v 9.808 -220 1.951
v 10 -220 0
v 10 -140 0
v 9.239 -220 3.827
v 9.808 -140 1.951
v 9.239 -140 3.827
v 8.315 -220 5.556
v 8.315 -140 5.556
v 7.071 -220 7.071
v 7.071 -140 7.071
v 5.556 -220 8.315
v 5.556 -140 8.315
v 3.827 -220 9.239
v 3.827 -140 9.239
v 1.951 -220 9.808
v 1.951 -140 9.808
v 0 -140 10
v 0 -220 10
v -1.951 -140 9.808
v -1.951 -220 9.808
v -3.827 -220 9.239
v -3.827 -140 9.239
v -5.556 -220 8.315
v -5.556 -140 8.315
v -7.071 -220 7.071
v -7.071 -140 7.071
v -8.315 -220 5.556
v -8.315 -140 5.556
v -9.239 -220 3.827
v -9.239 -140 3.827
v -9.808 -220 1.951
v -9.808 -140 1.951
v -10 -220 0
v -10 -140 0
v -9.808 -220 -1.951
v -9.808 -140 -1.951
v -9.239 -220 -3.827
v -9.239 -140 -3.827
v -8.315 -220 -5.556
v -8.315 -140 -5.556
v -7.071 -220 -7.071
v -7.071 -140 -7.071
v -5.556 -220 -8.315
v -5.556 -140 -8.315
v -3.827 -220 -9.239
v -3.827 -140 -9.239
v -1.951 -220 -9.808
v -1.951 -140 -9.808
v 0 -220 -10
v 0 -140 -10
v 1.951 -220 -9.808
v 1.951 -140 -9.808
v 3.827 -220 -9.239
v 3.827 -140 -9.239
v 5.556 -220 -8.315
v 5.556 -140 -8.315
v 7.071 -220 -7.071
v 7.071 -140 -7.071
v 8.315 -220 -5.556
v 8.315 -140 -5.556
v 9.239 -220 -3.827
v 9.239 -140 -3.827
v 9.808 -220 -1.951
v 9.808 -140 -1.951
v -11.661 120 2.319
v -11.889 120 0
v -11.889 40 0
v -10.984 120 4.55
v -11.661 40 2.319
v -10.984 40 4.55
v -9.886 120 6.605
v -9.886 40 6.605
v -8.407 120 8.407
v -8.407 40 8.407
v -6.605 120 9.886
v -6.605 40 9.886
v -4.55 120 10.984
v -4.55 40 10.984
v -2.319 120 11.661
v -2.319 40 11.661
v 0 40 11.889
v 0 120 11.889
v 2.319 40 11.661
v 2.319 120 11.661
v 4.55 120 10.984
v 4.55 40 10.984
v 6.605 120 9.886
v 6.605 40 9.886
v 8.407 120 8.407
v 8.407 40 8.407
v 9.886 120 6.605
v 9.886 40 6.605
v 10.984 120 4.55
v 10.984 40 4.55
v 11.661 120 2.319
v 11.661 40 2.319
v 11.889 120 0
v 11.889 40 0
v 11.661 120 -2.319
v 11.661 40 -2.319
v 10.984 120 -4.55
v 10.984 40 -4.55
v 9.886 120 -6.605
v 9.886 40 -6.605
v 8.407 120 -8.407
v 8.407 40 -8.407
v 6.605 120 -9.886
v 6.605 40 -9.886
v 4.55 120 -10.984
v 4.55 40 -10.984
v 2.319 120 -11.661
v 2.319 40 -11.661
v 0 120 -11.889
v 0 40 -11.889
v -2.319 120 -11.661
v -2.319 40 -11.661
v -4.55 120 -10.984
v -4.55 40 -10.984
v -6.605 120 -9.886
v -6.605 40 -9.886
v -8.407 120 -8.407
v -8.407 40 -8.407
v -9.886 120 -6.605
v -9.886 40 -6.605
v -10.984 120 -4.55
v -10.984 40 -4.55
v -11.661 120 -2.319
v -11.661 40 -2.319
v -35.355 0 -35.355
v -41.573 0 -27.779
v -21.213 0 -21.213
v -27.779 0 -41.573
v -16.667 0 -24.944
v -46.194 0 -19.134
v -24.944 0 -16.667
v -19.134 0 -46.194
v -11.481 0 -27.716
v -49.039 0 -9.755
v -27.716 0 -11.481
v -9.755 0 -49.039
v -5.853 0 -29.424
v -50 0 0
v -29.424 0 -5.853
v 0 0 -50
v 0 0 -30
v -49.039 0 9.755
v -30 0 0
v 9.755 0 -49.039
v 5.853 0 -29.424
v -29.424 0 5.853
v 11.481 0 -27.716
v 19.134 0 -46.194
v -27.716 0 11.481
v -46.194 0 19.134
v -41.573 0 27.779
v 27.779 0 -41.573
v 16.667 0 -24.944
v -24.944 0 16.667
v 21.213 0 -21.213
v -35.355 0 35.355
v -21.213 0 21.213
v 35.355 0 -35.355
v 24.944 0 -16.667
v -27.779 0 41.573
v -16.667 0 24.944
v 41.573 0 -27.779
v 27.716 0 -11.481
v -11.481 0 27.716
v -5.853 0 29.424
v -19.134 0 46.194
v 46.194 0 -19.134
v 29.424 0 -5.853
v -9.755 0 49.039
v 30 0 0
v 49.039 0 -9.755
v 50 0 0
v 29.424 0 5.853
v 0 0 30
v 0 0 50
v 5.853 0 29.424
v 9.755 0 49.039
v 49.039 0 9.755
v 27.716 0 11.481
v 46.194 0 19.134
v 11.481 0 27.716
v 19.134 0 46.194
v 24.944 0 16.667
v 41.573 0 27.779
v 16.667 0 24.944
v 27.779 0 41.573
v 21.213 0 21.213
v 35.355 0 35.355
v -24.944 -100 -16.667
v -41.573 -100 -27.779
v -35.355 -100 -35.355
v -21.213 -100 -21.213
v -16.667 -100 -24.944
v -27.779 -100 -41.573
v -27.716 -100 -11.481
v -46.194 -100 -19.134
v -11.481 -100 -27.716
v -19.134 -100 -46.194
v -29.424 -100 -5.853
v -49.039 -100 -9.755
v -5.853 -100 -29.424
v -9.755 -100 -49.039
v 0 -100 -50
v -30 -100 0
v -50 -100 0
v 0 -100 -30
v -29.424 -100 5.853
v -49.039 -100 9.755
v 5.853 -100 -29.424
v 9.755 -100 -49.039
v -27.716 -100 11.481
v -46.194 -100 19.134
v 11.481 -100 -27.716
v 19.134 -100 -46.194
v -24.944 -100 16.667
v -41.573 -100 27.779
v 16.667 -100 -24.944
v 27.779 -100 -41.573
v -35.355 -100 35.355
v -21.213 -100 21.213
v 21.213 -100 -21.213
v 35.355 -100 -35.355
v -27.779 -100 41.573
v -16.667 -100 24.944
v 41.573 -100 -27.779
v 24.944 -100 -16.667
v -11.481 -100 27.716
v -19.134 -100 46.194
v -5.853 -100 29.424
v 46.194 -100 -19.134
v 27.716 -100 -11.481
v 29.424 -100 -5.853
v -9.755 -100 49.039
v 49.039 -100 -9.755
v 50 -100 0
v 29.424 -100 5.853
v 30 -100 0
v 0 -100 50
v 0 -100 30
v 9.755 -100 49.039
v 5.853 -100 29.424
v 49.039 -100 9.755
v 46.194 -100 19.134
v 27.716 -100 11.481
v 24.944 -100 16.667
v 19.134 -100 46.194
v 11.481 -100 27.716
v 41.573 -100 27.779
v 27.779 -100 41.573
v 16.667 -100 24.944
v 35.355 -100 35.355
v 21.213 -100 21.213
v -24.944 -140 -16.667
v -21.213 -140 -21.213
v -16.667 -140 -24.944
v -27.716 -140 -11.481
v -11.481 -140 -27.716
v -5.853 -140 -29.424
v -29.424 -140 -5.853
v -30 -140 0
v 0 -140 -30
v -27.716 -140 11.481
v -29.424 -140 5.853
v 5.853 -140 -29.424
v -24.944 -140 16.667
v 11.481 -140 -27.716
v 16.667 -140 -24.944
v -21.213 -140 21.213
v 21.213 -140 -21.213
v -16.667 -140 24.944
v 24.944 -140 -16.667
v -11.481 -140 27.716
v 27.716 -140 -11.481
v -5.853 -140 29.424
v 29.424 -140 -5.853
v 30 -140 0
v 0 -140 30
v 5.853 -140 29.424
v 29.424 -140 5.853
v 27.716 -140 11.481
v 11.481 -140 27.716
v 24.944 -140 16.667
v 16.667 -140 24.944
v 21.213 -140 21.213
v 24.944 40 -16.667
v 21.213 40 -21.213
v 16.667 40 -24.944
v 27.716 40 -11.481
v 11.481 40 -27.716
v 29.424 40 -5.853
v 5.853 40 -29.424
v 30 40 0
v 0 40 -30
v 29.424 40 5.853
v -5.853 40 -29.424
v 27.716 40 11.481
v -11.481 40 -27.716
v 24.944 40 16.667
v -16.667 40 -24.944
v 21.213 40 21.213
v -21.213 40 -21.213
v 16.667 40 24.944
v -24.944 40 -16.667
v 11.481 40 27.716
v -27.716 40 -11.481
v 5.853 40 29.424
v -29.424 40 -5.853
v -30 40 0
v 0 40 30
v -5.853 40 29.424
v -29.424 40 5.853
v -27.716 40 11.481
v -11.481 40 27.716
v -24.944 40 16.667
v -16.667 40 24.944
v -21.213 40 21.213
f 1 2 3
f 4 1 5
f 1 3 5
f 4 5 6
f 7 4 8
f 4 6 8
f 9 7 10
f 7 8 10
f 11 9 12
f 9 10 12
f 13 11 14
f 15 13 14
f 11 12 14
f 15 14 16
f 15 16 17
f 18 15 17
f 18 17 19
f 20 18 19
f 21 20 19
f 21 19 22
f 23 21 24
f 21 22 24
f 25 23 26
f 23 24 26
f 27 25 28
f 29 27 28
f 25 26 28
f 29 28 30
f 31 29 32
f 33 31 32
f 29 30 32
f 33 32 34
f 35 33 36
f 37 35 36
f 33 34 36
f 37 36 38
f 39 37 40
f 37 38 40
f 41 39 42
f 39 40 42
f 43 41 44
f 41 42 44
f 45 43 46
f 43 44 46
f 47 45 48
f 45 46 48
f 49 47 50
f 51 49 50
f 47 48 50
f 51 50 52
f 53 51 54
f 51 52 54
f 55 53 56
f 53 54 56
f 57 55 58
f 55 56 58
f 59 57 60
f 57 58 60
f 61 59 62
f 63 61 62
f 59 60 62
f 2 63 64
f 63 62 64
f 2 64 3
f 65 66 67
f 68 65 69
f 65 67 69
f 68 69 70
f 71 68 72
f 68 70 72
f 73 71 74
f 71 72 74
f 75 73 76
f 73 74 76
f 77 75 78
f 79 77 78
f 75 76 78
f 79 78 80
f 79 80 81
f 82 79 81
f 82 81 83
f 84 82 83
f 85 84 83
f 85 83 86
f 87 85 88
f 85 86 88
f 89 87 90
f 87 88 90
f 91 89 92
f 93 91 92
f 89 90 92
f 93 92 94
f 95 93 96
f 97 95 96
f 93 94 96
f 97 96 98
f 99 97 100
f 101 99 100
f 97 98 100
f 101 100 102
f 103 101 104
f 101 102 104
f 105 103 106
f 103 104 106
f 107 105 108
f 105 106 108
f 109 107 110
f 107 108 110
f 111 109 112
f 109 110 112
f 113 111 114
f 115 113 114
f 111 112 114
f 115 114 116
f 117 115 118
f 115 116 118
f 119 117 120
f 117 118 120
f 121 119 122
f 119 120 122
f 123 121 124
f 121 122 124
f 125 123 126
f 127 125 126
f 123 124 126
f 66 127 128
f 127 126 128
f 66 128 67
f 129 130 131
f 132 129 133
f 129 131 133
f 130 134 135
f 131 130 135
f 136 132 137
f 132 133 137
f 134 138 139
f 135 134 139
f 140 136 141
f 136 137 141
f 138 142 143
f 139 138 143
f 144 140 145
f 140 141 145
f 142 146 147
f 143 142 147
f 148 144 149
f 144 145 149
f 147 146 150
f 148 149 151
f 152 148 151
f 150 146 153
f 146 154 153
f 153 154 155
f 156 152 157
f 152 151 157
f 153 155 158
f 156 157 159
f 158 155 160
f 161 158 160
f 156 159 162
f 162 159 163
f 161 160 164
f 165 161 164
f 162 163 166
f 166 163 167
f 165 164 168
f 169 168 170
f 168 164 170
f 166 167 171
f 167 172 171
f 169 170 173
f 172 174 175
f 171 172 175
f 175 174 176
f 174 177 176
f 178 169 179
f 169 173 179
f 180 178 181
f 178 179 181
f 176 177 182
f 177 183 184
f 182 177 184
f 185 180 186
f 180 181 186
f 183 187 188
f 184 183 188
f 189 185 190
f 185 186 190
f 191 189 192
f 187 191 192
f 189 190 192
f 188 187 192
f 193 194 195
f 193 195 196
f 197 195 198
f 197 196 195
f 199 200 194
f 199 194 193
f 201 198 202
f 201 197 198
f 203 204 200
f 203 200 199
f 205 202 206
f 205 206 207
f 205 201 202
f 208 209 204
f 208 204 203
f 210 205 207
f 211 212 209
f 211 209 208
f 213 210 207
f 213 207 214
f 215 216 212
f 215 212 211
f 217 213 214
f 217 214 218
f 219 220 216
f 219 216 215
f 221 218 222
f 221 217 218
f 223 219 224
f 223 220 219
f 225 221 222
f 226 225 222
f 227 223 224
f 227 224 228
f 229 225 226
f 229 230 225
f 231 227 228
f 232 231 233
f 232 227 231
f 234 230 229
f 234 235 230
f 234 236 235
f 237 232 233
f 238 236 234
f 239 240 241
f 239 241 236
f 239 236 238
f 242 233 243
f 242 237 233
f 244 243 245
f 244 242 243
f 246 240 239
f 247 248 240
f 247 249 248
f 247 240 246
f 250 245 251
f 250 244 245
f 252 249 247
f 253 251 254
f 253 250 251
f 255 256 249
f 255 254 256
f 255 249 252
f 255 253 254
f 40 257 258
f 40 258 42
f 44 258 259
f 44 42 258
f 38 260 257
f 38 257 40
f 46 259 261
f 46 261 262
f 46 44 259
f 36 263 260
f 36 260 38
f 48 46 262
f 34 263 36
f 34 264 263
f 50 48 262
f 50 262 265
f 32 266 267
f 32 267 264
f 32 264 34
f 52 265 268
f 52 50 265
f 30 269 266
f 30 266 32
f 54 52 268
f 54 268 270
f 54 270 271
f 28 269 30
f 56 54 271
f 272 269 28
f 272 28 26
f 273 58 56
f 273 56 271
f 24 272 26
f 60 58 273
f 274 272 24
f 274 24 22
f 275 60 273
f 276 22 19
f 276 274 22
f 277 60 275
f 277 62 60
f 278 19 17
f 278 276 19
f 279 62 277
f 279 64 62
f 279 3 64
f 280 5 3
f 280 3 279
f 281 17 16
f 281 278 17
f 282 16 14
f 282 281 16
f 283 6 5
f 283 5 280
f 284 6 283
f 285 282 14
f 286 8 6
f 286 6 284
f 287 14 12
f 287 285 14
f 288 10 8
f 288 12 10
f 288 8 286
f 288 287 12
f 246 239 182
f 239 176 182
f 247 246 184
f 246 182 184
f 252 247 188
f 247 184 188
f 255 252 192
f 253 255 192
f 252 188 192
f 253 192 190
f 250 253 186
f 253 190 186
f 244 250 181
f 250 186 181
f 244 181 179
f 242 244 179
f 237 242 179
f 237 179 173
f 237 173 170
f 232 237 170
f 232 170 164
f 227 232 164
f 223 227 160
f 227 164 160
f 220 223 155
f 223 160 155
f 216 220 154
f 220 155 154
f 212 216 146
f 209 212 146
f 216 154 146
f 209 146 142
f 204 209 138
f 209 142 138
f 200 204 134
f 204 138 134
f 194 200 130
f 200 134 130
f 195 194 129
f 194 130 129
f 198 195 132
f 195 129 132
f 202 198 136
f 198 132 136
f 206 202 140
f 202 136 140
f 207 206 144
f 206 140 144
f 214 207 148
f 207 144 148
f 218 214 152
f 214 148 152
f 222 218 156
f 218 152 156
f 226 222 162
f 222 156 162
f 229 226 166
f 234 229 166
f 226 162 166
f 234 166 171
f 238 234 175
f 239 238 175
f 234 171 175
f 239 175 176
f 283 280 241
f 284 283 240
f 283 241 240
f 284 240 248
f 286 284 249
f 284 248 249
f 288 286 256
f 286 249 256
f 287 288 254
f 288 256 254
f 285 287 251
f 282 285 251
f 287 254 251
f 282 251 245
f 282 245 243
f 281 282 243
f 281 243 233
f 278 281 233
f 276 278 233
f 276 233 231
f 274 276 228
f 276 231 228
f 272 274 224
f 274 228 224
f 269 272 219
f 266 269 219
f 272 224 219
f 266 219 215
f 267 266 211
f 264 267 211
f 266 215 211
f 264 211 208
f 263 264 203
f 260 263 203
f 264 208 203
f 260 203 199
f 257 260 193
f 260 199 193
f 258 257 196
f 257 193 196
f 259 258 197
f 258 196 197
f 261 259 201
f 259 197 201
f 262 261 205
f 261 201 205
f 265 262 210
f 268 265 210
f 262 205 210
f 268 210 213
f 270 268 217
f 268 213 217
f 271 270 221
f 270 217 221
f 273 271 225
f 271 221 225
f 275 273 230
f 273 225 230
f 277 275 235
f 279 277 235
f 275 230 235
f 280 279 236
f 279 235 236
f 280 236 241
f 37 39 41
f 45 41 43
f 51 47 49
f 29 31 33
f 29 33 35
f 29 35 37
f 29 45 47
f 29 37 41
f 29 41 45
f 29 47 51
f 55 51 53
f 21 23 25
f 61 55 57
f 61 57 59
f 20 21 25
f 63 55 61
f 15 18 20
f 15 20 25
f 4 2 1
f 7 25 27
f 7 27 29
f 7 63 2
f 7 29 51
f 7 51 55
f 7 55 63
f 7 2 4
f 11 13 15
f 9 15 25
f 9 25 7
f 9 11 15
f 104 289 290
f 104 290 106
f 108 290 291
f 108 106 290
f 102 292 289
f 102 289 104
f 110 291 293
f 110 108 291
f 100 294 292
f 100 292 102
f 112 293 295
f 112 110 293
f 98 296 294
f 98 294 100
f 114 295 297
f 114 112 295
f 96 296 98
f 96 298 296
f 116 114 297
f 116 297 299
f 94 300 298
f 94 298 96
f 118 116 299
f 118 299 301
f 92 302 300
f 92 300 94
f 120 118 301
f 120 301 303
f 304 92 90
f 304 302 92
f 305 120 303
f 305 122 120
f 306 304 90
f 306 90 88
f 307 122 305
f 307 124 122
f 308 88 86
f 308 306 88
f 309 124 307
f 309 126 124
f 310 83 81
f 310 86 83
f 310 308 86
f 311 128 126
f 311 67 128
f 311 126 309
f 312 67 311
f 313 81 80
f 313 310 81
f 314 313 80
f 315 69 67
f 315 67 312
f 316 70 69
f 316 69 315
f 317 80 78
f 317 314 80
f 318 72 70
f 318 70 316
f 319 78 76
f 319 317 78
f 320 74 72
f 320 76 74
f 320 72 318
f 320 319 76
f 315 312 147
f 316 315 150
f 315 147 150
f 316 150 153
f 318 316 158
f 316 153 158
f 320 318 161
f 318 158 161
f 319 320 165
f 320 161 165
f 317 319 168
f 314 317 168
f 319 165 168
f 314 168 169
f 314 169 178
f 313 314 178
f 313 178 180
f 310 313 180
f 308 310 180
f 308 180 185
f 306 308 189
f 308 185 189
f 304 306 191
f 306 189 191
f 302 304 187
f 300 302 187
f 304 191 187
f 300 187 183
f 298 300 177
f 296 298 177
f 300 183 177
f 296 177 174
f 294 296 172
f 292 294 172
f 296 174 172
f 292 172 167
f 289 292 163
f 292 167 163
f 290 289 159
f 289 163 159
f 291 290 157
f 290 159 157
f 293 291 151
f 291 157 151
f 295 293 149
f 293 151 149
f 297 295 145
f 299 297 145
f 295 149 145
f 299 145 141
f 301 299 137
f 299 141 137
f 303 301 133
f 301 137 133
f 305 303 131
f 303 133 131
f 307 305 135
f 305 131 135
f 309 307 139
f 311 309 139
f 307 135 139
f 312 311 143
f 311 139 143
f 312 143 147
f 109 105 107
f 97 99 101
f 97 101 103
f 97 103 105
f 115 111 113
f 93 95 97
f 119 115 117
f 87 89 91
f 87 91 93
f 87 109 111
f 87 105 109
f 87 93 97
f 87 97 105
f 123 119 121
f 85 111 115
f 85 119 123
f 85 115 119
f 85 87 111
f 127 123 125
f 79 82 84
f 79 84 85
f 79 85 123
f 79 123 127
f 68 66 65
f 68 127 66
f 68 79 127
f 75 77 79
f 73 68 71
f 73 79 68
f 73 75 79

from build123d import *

# Parameters (mm, degrees)
F0_R      = 50
F1_DEPTH  = 40
F1_FACE_R = 50
F2_DEPTH  = 60
F3_R      = 30
F4_DEPTH  = 40
F5_R      = 10
F6_DEPTH  = 80
F7_R      = 30
F8_DEPTH  = 40
F9_R      = 11.8892
F10_DEPTH = 80


with BuildPart() as f1:
    # F0 (on Front) → F1 (new body)
    with BuildSketch(Plane.XZ):
        Circle(F0_R)
    extrude(amount=F1_DEPTH)

    # F1_face (on face) → F2 (join)
    with BuildSketch(Plane.XZ.offset(40)):
        Circle(F1_FACE_R)
    extrude(amount=F2_DEPTH)

    # F3 (on face) → F4 (join)
    with BuildSketch(Plane.XZ.offset(100)):
        Circle(F3_R)
    extrude(amount=F4_DEPTH)

    # F5 (on face) → F6 (join)
    with BuildSketch(Plane.XZ.offset(140)):
        Circle(F5_R)
    extrude(amount=F6_DEPTH)

    # F7 (on face) → F8 (join)
    with BuildSketch(Plane(origin=(0, 0, 0), x_dir=(-1, 0, 0), z_dir=(0, 1, 0))):
        Circle(F7_R)
    extrude(amount=F8_DEPTH)

    # F9 (on face) → F10 (join)
    with BuildSketch(Plane(origin=(0, 40, 0), x_dir=(-1, 0, 0), z_dir=(0, 1, 0))):
        Circle(F9_R)
    extrude(amount=F10_DEPTH)


solid = f1.part
